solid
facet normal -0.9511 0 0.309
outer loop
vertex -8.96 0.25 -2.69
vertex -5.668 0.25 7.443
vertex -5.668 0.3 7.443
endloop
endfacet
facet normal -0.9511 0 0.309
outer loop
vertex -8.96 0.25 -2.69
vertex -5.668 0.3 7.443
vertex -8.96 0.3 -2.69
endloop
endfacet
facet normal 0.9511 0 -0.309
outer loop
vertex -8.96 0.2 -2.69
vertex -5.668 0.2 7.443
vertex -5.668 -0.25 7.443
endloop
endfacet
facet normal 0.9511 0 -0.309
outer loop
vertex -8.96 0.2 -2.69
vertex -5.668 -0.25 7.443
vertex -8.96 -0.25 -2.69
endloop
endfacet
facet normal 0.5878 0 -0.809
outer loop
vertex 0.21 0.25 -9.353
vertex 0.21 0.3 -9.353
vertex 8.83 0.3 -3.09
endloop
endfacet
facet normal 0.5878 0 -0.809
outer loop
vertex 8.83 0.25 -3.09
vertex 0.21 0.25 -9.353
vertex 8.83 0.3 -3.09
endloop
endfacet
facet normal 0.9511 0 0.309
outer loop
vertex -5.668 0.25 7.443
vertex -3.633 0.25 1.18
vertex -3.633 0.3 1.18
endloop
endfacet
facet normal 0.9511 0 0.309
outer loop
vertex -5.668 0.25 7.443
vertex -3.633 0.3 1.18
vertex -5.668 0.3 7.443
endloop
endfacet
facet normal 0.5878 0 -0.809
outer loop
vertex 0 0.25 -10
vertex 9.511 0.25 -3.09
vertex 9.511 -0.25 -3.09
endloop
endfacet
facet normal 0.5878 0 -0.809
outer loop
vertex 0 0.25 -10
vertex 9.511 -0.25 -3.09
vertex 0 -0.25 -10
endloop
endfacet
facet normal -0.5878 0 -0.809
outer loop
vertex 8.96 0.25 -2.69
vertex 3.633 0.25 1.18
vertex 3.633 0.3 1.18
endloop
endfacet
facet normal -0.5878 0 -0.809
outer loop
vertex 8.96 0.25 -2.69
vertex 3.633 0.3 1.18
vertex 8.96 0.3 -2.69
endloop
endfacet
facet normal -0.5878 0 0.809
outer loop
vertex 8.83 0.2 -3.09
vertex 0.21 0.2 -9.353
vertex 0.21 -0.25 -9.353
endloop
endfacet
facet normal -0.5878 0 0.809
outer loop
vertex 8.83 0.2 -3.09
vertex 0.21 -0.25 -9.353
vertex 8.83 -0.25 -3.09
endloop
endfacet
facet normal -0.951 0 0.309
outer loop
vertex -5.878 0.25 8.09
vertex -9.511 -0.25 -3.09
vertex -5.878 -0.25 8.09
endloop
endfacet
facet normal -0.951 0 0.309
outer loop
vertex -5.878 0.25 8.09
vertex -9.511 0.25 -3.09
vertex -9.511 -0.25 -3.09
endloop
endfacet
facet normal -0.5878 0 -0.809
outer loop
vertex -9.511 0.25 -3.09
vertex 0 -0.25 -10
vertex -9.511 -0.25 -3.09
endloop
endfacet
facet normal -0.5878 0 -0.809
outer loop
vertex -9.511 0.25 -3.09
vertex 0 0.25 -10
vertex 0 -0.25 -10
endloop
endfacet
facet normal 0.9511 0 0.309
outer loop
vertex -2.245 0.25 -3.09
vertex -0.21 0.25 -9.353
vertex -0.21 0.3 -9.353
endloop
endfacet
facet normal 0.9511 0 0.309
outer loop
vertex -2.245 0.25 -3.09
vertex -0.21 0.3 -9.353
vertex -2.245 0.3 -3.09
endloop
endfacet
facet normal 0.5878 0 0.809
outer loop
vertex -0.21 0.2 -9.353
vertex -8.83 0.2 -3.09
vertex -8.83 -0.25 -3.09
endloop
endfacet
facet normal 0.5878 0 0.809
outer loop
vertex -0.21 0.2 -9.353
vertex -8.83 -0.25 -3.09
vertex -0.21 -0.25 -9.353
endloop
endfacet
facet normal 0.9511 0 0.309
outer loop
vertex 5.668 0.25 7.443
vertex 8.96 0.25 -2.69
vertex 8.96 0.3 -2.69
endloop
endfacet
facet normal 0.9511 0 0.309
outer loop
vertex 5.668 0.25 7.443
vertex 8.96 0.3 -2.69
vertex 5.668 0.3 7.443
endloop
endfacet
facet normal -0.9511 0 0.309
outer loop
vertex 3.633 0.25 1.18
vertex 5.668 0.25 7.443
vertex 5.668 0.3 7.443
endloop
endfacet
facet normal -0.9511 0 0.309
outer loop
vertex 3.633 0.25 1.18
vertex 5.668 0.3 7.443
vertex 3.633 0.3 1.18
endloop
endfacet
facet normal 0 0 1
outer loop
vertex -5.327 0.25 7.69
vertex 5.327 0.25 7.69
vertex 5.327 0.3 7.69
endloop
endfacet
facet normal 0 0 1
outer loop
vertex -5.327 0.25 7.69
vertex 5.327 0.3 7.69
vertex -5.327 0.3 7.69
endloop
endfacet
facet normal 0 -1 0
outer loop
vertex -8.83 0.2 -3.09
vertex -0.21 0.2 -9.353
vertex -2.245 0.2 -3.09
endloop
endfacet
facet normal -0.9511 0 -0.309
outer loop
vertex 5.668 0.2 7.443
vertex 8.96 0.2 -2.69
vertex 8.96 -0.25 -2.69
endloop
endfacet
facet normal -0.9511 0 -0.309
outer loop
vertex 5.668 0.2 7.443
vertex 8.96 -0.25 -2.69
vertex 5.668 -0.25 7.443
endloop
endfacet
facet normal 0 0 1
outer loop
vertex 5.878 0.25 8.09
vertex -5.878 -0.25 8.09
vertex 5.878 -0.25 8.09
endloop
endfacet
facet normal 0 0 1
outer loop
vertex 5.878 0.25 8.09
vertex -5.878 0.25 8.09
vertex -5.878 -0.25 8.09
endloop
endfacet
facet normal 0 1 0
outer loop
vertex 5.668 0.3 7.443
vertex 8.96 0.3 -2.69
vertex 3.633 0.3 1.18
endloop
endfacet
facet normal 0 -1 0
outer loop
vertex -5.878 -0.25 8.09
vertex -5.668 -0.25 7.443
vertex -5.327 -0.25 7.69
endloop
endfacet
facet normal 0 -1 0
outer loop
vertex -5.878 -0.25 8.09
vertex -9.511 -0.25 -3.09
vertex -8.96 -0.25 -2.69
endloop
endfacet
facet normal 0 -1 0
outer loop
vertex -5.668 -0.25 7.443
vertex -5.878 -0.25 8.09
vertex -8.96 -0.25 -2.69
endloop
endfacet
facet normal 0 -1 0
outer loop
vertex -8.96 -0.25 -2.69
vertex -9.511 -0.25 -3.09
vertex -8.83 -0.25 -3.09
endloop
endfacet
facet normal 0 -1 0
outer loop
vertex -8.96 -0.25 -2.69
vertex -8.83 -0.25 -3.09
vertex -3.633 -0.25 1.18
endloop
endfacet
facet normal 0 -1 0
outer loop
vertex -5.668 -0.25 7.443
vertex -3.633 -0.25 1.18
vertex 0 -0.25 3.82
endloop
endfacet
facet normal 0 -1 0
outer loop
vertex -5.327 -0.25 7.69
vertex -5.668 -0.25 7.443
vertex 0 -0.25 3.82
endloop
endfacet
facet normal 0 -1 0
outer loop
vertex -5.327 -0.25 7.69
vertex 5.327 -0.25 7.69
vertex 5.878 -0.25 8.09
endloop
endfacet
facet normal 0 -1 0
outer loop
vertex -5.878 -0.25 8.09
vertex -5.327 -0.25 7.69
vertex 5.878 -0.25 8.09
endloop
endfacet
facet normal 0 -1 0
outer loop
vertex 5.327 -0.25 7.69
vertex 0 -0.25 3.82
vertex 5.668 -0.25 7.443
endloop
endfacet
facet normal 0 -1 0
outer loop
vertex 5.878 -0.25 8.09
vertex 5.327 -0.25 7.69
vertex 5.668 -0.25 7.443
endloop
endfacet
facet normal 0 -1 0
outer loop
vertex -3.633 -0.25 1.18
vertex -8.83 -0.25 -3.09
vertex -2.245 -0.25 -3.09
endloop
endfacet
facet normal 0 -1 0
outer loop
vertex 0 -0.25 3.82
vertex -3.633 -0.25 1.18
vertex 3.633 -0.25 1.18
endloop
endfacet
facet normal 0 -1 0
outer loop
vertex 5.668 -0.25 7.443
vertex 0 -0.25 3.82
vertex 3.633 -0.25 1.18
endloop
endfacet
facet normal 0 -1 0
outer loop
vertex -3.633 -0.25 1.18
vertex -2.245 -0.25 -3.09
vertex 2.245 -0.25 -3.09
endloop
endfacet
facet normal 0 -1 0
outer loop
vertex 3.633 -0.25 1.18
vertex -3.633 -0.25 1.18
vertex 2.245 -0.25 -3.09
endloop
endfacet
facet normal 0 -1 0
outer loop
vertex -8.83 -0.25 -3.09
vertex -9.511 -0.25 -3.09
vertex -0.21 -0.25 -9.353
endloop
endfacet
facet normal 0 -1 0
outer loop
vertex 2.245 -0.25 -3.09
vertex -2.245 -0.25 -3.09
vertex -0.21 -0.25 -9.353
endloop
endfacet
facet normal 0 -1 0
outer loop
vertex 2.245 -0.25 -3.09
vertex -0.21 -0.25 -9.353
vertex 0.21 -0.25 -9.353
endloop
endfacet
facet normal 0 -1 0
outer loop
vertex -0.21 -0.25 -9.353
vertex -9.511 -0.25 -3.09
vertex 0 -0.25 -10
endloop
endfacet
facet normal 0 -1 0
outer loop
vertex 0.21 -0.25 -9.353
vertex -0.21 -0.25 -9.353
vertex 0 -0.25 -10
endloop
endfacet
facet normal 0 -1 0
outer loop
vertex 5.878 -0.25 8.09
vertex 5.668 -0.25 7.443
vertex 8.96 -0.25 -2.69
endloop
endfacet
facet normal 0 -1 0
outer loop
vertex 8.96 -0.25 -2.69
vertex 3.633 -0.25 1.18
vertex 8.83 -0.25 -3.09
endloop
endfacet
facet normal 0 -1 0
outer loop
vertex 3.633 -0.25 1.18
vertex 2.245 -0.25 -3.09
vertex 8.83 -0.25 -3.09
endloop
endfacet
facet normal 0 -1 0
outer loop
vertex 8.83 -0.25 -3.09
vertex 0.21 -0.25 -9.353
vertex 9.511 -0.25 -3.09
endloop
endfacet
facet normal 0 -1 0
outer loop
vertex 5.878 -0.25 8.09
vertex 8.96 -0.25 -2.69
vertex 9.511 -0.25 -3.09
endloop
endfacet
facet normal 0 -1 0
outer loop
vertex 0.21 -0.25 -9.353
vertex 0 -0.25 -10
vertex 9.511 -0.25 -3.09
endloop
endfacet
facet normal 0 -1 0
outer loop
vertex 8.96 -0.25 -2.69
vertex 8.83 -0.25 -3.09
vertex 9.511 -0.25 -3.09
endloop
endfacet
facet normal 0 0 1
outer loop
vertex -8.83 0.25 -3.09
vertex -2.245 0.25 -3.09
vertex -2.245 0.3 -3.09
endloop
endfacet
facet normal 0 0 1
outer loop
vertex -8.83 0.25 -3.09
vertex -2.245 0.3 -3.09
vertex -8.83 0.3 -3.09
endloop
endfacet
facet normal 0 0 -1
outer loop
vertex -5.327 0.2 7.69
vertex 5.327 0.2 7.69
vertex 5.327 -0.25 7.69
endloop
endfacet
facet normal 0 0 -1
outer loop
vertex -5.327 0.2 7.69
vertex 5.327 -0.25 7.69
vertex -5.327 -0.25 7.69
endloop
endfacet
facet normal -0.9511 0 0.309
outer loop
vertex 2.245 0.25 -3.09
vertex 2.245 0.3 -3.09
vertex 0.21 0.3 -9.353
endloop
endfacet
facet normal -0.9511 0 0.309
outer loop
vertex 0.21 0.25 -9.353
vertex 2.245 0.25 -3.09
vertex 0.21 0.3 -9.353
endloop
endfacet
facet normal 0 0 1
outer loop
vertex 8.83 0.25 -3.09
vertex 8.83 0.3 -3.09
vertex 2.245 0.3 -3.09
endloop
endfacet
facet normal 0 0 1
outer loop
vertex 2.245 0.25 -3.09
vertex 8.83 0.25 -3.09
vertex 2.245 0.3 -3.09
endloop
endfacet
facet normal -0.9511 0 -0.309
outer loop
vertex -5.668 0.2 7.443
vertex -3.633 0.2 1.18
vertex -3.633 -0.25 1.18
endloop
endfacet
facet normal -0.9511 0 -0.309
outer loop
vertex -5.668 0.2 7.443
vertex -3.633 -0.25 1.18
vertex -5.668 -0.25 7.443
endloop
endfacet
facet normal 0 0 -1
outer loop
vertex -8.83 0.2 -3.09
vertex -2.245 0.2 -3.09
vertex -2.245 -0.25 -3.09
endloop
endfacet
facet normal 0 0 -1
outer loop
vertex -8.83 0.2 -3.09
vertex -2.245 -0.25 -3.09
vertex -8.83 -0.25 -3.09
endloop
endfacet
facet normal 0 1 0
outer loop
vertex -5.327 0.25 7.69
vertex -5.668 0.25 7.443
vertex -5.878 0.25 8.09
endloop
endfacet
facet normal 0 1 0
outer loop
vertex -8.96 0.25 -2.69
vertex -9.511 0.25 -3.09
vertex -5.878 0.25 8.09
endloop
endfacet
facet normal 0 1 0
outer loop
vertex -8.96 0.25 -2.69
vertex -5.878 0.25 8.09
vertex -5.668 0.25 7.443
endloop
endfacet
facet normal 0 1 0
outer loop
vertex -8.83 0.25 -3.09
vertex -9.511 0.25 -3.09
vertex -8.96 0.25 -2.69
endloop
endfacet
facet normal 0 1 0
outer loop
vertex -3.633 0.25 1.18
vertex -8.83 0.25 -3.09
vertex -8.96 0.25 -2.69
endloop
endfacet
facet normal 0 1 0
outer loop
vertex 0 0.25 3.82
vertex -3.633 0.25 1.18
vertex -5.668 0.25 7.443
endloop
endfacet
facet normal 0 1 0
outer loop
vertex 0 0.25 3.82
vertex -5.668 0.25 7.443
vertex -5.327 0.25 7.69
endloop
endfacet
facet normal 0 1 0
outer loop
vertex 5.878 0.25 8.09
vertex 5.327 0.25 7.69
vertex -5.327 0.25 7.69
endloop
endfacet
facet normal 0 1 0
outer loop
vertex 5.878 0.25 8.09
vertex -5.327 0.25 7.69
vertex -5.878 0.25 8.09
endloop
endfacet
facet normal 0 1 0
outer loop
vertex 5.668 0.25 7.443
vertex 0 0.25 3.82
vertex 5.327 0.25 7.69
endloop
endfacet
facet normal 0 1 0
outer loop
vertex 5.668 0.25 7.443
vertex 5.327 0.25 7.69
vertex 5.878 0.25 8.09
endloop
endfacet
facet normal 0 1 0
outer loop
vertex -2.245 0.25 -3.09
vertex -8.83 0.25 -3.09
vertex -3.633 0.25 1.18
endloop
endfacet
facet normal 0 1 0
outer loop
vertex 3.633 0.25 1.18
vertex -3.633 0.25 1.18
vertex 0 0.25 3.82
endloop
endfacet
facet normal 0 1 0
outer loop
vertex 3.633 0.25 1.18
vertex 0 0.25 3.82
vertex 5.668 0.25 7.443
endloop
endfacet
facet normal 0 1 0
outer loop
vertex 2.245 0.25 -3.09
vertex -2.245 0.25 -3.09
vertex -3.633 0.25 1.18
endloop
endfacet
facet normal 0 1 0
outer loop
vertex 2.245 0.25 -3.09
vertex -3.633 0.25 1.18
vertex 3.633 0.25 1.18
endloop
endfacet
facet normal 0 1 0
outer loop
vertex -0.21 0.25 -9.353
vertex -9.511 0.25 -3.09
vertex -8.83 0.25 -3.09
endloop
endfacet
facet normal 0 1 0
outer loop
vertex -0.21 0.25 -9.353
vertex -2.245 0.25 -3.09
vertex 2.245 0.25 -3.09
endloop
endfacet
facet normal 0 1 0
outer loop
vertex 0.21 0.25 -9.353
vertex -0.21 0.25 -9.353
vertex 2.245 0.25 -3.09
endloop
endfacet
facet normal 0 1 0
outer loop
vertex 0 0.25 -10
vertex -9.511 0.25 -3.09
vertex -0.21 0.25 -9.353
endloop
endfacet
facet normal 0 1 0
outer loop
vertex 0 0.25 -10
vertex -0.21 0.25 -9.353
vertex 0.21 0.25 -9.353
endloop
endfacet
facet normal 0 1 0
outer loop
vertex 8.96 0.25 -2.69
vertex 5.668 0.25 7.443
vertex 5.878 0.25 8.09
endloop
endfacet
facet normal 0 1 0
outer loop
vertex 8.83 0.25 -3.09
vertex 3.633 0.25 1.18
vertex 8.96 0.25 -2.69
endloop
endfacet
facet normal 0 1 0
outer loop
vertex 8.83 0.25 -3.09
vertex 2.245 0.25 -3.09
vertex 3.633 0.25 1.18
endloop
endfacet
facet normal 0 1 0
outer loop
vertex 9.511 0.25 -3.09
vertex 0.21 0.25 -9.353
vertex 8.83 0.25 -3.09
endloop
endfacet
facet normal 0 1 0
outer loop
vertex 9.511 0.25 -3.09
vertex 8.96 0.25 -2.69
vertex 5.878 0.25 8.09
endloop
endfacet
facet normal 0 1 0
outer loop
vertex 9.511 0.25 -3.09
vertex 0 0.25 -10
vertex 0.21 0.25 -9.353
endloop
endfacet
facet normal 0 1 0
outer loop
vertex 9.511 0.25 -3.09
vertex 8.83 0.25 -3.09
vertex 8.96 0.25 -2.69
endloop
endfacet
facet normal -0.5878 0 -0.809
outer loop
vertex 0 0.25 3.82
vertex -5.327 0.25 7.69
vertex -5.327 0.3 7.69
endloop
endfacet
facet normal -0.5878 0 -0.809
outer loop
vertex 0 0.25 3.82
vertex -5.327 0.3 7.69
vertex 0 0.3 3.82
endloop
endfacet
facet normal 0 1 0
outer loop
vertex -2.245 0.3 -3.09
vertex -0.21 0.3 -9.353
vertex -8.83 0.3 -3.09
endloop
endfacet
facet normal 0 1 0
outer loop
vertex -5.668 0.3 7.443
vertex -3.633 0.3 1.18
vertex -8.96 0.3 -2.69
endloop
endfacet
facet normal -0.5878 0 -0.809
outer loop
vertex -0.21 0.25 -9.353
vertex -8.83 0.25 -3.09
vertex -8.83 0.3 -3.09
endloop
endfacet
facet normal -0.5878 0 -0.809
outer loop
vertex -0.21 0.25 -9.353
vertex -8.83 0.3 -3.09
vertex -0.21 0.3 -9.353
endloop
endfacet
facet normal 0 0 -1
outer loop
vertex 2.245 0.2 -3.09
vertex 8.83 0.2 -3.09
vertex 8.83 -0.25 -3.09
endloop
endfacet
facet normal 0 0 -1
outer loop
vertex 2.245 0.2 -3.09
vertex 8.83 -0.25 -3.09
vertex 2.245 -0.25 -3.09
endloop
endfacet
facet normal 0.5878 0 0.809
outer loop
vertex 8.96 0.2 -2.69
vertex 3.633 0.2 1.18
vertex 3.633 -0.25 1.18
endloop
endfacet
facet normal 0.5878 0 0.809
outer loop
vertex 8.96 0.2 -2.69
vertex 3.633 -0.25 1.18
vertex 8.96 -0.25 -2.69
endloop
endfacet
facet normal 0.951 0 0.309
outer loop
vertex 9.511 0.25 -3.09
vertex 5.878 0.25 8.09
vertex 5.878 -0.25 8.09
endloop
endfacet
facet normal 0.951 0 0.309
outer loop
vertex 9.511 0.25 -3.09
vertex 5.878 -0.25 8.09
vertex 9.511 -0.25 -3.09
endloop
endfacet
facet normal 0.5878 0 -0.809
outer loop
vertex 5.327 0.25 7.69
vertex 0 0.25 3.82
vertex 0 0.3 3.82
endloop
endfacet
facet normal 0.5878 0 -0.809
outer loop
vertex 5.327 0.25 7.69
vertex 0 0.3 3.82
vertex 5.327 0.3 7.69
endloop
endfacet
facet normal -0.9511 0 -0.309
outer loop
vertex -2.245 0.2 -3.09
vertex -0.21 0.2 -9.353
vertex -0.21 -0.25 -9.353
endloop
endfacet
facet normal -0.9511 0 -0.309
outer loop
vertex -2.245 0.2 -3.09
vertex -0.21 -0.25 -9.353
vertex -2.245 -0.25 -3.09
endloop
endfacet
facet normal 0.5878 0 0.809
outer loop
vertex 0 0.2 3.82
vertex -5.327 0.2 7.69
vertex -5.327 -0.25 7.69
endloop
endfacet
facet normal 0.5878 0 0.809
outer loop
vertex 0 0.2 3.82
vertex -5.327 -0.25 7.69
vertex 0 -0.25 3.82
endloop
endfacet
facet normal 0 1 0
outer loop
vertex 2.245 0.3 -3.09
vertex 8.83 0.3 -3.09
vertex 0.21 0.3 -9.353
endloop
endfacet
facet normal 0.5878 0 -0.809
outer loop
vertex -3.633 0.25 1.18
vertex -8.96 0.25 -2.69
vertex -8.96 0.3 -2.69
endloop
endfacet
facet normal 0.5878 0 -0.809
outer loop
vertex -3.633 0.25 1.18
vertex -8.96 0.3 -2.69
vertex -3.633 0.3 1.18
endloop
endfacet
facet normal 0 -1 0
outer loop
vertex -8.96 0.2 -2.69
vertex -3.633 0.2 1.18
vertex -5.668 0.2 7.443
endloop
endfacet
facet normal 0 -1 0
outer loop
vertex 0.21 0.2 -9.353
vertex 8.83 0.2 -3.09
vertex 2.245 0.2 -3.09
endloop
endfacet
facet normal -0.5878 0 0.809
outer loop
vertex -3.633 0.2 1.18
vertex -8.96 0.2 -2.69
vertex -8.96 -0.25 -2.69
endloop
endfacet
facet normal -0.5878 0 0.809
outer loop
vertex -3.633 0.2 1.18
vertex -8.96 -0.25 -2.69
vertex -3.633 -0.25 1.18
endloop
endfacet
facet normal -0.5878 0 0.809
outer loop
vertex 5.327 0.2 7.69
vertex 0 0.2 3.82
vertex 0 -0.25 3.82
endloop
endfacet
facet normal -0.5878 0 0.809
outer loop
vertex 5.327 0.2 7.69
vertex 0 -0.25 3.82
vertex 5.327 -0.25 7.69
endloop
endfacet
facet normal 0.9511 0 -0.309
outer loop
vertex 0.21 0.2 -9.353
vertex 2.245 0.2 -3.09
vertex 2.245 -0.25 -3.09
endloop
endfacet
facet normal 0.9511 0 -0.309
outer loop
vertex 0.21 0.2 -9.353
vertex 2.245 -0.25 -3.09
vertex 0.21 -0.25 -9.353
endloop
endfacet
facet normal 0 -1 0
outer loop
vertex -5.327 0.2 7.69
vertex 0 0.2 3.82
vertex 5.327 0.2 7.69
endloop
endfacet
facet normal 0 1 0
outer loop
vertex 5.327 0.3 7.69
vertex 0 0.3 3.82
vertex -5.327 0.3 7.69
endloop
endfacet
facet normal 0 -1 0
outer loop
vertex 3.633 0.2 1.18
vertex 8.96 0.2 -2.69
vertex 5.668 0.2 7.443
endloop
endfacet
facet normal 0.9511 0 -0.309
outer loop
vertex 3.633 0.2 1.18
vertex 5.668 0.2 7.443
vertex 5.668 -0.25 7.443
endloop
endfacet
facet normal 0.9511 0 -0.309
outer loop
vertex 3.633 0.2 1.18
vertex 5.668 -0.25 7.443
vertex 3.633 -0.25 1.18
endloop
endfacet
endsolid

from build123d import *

# Parameters (mm, degrees)
BOSS_EXTRUDE1_DEPTH = 0.25
BOSS_EXTRUDE2_DEPTH = 0.05


with BuildPart() as part:
    # Sketch1 → Boss-Extrude1 (new, symmetric)
    with BuildSketch(Plane(origin=(0, 0, 0), x_dir=(1, 0, 0), z_dir=(0, 1, 0))):
        Polygon((-5.877852523, -8.090169944), (5.877852523, -8.090169944), (9.510565163, 3.090169944), (0, 10), (-9.510565163, 3.090169944), align=None)
        Polygon((-5.667560078, -7.442956348), (-8.960012395, 2.690169944), (-3.63271264, -1.180339887), align=None, mode=Mode.SUBTRACT)
        Polygon((5.327299755, -7.690169944), (-5.327299755, -7.690169944), (0, -3.819660113), align=None, mode=Mode.SUBTRACT)
        Polygon((8.960012395, 2.690169944), (5.667560078, -7.442956348), (3.63271264, -1.180339887), align=None, mode=Mode.SUBTRACT)
        Polygon((-8.830044516, 3.090169944), (-0.210292445, 9.352786405), (-2.245139883, 3.090169944), align=None, mode=Mode.SUBTRACT)
        Polygon((0.210292445, 9.352786405), (8.830044516, 3.090169944), (2.245139883, 3.090169944), align=None, mode=Mode.SUBTRACT)
    extrude(amount=BOSS_EXTRUDE1_DEPTH, both=True)

    # Sketch2 → Boss-Extrude2 (add, symmetric)
    with BuildSketch(Plane(origin=(0, 0.25, 0), x_dir=(1, 0, 0), z_dir=(0, 1, 0))):
        Polygon((-2.245139883, 3.090169944), (-8.830044516, 3.090169944), (-0.210292445, 9.352786405), align=None)
        Polygon((-8.960012395, 2.690169944), (-3.63271264, -1.180339887), (-5.667560078, -7.442956348), align=None)
        Polygon((-5.327299755, -7.690169944), (0, -3.819660113), (5.327299755, -7.690169944), align=None)
        Polygon((8.960012395, 2.690169944), (5.667560078, -7.442956348), (3.63271264, -1.180339887), align=None)
        Polygon((8.830044516, 3.090169944), (2.245139883, 3.090169944), (0.210292445, 9.352786405), align=None)
    extrude(amount=BOSS_EXTRUDE2_DEPTH, both=True)


solid = part.part
